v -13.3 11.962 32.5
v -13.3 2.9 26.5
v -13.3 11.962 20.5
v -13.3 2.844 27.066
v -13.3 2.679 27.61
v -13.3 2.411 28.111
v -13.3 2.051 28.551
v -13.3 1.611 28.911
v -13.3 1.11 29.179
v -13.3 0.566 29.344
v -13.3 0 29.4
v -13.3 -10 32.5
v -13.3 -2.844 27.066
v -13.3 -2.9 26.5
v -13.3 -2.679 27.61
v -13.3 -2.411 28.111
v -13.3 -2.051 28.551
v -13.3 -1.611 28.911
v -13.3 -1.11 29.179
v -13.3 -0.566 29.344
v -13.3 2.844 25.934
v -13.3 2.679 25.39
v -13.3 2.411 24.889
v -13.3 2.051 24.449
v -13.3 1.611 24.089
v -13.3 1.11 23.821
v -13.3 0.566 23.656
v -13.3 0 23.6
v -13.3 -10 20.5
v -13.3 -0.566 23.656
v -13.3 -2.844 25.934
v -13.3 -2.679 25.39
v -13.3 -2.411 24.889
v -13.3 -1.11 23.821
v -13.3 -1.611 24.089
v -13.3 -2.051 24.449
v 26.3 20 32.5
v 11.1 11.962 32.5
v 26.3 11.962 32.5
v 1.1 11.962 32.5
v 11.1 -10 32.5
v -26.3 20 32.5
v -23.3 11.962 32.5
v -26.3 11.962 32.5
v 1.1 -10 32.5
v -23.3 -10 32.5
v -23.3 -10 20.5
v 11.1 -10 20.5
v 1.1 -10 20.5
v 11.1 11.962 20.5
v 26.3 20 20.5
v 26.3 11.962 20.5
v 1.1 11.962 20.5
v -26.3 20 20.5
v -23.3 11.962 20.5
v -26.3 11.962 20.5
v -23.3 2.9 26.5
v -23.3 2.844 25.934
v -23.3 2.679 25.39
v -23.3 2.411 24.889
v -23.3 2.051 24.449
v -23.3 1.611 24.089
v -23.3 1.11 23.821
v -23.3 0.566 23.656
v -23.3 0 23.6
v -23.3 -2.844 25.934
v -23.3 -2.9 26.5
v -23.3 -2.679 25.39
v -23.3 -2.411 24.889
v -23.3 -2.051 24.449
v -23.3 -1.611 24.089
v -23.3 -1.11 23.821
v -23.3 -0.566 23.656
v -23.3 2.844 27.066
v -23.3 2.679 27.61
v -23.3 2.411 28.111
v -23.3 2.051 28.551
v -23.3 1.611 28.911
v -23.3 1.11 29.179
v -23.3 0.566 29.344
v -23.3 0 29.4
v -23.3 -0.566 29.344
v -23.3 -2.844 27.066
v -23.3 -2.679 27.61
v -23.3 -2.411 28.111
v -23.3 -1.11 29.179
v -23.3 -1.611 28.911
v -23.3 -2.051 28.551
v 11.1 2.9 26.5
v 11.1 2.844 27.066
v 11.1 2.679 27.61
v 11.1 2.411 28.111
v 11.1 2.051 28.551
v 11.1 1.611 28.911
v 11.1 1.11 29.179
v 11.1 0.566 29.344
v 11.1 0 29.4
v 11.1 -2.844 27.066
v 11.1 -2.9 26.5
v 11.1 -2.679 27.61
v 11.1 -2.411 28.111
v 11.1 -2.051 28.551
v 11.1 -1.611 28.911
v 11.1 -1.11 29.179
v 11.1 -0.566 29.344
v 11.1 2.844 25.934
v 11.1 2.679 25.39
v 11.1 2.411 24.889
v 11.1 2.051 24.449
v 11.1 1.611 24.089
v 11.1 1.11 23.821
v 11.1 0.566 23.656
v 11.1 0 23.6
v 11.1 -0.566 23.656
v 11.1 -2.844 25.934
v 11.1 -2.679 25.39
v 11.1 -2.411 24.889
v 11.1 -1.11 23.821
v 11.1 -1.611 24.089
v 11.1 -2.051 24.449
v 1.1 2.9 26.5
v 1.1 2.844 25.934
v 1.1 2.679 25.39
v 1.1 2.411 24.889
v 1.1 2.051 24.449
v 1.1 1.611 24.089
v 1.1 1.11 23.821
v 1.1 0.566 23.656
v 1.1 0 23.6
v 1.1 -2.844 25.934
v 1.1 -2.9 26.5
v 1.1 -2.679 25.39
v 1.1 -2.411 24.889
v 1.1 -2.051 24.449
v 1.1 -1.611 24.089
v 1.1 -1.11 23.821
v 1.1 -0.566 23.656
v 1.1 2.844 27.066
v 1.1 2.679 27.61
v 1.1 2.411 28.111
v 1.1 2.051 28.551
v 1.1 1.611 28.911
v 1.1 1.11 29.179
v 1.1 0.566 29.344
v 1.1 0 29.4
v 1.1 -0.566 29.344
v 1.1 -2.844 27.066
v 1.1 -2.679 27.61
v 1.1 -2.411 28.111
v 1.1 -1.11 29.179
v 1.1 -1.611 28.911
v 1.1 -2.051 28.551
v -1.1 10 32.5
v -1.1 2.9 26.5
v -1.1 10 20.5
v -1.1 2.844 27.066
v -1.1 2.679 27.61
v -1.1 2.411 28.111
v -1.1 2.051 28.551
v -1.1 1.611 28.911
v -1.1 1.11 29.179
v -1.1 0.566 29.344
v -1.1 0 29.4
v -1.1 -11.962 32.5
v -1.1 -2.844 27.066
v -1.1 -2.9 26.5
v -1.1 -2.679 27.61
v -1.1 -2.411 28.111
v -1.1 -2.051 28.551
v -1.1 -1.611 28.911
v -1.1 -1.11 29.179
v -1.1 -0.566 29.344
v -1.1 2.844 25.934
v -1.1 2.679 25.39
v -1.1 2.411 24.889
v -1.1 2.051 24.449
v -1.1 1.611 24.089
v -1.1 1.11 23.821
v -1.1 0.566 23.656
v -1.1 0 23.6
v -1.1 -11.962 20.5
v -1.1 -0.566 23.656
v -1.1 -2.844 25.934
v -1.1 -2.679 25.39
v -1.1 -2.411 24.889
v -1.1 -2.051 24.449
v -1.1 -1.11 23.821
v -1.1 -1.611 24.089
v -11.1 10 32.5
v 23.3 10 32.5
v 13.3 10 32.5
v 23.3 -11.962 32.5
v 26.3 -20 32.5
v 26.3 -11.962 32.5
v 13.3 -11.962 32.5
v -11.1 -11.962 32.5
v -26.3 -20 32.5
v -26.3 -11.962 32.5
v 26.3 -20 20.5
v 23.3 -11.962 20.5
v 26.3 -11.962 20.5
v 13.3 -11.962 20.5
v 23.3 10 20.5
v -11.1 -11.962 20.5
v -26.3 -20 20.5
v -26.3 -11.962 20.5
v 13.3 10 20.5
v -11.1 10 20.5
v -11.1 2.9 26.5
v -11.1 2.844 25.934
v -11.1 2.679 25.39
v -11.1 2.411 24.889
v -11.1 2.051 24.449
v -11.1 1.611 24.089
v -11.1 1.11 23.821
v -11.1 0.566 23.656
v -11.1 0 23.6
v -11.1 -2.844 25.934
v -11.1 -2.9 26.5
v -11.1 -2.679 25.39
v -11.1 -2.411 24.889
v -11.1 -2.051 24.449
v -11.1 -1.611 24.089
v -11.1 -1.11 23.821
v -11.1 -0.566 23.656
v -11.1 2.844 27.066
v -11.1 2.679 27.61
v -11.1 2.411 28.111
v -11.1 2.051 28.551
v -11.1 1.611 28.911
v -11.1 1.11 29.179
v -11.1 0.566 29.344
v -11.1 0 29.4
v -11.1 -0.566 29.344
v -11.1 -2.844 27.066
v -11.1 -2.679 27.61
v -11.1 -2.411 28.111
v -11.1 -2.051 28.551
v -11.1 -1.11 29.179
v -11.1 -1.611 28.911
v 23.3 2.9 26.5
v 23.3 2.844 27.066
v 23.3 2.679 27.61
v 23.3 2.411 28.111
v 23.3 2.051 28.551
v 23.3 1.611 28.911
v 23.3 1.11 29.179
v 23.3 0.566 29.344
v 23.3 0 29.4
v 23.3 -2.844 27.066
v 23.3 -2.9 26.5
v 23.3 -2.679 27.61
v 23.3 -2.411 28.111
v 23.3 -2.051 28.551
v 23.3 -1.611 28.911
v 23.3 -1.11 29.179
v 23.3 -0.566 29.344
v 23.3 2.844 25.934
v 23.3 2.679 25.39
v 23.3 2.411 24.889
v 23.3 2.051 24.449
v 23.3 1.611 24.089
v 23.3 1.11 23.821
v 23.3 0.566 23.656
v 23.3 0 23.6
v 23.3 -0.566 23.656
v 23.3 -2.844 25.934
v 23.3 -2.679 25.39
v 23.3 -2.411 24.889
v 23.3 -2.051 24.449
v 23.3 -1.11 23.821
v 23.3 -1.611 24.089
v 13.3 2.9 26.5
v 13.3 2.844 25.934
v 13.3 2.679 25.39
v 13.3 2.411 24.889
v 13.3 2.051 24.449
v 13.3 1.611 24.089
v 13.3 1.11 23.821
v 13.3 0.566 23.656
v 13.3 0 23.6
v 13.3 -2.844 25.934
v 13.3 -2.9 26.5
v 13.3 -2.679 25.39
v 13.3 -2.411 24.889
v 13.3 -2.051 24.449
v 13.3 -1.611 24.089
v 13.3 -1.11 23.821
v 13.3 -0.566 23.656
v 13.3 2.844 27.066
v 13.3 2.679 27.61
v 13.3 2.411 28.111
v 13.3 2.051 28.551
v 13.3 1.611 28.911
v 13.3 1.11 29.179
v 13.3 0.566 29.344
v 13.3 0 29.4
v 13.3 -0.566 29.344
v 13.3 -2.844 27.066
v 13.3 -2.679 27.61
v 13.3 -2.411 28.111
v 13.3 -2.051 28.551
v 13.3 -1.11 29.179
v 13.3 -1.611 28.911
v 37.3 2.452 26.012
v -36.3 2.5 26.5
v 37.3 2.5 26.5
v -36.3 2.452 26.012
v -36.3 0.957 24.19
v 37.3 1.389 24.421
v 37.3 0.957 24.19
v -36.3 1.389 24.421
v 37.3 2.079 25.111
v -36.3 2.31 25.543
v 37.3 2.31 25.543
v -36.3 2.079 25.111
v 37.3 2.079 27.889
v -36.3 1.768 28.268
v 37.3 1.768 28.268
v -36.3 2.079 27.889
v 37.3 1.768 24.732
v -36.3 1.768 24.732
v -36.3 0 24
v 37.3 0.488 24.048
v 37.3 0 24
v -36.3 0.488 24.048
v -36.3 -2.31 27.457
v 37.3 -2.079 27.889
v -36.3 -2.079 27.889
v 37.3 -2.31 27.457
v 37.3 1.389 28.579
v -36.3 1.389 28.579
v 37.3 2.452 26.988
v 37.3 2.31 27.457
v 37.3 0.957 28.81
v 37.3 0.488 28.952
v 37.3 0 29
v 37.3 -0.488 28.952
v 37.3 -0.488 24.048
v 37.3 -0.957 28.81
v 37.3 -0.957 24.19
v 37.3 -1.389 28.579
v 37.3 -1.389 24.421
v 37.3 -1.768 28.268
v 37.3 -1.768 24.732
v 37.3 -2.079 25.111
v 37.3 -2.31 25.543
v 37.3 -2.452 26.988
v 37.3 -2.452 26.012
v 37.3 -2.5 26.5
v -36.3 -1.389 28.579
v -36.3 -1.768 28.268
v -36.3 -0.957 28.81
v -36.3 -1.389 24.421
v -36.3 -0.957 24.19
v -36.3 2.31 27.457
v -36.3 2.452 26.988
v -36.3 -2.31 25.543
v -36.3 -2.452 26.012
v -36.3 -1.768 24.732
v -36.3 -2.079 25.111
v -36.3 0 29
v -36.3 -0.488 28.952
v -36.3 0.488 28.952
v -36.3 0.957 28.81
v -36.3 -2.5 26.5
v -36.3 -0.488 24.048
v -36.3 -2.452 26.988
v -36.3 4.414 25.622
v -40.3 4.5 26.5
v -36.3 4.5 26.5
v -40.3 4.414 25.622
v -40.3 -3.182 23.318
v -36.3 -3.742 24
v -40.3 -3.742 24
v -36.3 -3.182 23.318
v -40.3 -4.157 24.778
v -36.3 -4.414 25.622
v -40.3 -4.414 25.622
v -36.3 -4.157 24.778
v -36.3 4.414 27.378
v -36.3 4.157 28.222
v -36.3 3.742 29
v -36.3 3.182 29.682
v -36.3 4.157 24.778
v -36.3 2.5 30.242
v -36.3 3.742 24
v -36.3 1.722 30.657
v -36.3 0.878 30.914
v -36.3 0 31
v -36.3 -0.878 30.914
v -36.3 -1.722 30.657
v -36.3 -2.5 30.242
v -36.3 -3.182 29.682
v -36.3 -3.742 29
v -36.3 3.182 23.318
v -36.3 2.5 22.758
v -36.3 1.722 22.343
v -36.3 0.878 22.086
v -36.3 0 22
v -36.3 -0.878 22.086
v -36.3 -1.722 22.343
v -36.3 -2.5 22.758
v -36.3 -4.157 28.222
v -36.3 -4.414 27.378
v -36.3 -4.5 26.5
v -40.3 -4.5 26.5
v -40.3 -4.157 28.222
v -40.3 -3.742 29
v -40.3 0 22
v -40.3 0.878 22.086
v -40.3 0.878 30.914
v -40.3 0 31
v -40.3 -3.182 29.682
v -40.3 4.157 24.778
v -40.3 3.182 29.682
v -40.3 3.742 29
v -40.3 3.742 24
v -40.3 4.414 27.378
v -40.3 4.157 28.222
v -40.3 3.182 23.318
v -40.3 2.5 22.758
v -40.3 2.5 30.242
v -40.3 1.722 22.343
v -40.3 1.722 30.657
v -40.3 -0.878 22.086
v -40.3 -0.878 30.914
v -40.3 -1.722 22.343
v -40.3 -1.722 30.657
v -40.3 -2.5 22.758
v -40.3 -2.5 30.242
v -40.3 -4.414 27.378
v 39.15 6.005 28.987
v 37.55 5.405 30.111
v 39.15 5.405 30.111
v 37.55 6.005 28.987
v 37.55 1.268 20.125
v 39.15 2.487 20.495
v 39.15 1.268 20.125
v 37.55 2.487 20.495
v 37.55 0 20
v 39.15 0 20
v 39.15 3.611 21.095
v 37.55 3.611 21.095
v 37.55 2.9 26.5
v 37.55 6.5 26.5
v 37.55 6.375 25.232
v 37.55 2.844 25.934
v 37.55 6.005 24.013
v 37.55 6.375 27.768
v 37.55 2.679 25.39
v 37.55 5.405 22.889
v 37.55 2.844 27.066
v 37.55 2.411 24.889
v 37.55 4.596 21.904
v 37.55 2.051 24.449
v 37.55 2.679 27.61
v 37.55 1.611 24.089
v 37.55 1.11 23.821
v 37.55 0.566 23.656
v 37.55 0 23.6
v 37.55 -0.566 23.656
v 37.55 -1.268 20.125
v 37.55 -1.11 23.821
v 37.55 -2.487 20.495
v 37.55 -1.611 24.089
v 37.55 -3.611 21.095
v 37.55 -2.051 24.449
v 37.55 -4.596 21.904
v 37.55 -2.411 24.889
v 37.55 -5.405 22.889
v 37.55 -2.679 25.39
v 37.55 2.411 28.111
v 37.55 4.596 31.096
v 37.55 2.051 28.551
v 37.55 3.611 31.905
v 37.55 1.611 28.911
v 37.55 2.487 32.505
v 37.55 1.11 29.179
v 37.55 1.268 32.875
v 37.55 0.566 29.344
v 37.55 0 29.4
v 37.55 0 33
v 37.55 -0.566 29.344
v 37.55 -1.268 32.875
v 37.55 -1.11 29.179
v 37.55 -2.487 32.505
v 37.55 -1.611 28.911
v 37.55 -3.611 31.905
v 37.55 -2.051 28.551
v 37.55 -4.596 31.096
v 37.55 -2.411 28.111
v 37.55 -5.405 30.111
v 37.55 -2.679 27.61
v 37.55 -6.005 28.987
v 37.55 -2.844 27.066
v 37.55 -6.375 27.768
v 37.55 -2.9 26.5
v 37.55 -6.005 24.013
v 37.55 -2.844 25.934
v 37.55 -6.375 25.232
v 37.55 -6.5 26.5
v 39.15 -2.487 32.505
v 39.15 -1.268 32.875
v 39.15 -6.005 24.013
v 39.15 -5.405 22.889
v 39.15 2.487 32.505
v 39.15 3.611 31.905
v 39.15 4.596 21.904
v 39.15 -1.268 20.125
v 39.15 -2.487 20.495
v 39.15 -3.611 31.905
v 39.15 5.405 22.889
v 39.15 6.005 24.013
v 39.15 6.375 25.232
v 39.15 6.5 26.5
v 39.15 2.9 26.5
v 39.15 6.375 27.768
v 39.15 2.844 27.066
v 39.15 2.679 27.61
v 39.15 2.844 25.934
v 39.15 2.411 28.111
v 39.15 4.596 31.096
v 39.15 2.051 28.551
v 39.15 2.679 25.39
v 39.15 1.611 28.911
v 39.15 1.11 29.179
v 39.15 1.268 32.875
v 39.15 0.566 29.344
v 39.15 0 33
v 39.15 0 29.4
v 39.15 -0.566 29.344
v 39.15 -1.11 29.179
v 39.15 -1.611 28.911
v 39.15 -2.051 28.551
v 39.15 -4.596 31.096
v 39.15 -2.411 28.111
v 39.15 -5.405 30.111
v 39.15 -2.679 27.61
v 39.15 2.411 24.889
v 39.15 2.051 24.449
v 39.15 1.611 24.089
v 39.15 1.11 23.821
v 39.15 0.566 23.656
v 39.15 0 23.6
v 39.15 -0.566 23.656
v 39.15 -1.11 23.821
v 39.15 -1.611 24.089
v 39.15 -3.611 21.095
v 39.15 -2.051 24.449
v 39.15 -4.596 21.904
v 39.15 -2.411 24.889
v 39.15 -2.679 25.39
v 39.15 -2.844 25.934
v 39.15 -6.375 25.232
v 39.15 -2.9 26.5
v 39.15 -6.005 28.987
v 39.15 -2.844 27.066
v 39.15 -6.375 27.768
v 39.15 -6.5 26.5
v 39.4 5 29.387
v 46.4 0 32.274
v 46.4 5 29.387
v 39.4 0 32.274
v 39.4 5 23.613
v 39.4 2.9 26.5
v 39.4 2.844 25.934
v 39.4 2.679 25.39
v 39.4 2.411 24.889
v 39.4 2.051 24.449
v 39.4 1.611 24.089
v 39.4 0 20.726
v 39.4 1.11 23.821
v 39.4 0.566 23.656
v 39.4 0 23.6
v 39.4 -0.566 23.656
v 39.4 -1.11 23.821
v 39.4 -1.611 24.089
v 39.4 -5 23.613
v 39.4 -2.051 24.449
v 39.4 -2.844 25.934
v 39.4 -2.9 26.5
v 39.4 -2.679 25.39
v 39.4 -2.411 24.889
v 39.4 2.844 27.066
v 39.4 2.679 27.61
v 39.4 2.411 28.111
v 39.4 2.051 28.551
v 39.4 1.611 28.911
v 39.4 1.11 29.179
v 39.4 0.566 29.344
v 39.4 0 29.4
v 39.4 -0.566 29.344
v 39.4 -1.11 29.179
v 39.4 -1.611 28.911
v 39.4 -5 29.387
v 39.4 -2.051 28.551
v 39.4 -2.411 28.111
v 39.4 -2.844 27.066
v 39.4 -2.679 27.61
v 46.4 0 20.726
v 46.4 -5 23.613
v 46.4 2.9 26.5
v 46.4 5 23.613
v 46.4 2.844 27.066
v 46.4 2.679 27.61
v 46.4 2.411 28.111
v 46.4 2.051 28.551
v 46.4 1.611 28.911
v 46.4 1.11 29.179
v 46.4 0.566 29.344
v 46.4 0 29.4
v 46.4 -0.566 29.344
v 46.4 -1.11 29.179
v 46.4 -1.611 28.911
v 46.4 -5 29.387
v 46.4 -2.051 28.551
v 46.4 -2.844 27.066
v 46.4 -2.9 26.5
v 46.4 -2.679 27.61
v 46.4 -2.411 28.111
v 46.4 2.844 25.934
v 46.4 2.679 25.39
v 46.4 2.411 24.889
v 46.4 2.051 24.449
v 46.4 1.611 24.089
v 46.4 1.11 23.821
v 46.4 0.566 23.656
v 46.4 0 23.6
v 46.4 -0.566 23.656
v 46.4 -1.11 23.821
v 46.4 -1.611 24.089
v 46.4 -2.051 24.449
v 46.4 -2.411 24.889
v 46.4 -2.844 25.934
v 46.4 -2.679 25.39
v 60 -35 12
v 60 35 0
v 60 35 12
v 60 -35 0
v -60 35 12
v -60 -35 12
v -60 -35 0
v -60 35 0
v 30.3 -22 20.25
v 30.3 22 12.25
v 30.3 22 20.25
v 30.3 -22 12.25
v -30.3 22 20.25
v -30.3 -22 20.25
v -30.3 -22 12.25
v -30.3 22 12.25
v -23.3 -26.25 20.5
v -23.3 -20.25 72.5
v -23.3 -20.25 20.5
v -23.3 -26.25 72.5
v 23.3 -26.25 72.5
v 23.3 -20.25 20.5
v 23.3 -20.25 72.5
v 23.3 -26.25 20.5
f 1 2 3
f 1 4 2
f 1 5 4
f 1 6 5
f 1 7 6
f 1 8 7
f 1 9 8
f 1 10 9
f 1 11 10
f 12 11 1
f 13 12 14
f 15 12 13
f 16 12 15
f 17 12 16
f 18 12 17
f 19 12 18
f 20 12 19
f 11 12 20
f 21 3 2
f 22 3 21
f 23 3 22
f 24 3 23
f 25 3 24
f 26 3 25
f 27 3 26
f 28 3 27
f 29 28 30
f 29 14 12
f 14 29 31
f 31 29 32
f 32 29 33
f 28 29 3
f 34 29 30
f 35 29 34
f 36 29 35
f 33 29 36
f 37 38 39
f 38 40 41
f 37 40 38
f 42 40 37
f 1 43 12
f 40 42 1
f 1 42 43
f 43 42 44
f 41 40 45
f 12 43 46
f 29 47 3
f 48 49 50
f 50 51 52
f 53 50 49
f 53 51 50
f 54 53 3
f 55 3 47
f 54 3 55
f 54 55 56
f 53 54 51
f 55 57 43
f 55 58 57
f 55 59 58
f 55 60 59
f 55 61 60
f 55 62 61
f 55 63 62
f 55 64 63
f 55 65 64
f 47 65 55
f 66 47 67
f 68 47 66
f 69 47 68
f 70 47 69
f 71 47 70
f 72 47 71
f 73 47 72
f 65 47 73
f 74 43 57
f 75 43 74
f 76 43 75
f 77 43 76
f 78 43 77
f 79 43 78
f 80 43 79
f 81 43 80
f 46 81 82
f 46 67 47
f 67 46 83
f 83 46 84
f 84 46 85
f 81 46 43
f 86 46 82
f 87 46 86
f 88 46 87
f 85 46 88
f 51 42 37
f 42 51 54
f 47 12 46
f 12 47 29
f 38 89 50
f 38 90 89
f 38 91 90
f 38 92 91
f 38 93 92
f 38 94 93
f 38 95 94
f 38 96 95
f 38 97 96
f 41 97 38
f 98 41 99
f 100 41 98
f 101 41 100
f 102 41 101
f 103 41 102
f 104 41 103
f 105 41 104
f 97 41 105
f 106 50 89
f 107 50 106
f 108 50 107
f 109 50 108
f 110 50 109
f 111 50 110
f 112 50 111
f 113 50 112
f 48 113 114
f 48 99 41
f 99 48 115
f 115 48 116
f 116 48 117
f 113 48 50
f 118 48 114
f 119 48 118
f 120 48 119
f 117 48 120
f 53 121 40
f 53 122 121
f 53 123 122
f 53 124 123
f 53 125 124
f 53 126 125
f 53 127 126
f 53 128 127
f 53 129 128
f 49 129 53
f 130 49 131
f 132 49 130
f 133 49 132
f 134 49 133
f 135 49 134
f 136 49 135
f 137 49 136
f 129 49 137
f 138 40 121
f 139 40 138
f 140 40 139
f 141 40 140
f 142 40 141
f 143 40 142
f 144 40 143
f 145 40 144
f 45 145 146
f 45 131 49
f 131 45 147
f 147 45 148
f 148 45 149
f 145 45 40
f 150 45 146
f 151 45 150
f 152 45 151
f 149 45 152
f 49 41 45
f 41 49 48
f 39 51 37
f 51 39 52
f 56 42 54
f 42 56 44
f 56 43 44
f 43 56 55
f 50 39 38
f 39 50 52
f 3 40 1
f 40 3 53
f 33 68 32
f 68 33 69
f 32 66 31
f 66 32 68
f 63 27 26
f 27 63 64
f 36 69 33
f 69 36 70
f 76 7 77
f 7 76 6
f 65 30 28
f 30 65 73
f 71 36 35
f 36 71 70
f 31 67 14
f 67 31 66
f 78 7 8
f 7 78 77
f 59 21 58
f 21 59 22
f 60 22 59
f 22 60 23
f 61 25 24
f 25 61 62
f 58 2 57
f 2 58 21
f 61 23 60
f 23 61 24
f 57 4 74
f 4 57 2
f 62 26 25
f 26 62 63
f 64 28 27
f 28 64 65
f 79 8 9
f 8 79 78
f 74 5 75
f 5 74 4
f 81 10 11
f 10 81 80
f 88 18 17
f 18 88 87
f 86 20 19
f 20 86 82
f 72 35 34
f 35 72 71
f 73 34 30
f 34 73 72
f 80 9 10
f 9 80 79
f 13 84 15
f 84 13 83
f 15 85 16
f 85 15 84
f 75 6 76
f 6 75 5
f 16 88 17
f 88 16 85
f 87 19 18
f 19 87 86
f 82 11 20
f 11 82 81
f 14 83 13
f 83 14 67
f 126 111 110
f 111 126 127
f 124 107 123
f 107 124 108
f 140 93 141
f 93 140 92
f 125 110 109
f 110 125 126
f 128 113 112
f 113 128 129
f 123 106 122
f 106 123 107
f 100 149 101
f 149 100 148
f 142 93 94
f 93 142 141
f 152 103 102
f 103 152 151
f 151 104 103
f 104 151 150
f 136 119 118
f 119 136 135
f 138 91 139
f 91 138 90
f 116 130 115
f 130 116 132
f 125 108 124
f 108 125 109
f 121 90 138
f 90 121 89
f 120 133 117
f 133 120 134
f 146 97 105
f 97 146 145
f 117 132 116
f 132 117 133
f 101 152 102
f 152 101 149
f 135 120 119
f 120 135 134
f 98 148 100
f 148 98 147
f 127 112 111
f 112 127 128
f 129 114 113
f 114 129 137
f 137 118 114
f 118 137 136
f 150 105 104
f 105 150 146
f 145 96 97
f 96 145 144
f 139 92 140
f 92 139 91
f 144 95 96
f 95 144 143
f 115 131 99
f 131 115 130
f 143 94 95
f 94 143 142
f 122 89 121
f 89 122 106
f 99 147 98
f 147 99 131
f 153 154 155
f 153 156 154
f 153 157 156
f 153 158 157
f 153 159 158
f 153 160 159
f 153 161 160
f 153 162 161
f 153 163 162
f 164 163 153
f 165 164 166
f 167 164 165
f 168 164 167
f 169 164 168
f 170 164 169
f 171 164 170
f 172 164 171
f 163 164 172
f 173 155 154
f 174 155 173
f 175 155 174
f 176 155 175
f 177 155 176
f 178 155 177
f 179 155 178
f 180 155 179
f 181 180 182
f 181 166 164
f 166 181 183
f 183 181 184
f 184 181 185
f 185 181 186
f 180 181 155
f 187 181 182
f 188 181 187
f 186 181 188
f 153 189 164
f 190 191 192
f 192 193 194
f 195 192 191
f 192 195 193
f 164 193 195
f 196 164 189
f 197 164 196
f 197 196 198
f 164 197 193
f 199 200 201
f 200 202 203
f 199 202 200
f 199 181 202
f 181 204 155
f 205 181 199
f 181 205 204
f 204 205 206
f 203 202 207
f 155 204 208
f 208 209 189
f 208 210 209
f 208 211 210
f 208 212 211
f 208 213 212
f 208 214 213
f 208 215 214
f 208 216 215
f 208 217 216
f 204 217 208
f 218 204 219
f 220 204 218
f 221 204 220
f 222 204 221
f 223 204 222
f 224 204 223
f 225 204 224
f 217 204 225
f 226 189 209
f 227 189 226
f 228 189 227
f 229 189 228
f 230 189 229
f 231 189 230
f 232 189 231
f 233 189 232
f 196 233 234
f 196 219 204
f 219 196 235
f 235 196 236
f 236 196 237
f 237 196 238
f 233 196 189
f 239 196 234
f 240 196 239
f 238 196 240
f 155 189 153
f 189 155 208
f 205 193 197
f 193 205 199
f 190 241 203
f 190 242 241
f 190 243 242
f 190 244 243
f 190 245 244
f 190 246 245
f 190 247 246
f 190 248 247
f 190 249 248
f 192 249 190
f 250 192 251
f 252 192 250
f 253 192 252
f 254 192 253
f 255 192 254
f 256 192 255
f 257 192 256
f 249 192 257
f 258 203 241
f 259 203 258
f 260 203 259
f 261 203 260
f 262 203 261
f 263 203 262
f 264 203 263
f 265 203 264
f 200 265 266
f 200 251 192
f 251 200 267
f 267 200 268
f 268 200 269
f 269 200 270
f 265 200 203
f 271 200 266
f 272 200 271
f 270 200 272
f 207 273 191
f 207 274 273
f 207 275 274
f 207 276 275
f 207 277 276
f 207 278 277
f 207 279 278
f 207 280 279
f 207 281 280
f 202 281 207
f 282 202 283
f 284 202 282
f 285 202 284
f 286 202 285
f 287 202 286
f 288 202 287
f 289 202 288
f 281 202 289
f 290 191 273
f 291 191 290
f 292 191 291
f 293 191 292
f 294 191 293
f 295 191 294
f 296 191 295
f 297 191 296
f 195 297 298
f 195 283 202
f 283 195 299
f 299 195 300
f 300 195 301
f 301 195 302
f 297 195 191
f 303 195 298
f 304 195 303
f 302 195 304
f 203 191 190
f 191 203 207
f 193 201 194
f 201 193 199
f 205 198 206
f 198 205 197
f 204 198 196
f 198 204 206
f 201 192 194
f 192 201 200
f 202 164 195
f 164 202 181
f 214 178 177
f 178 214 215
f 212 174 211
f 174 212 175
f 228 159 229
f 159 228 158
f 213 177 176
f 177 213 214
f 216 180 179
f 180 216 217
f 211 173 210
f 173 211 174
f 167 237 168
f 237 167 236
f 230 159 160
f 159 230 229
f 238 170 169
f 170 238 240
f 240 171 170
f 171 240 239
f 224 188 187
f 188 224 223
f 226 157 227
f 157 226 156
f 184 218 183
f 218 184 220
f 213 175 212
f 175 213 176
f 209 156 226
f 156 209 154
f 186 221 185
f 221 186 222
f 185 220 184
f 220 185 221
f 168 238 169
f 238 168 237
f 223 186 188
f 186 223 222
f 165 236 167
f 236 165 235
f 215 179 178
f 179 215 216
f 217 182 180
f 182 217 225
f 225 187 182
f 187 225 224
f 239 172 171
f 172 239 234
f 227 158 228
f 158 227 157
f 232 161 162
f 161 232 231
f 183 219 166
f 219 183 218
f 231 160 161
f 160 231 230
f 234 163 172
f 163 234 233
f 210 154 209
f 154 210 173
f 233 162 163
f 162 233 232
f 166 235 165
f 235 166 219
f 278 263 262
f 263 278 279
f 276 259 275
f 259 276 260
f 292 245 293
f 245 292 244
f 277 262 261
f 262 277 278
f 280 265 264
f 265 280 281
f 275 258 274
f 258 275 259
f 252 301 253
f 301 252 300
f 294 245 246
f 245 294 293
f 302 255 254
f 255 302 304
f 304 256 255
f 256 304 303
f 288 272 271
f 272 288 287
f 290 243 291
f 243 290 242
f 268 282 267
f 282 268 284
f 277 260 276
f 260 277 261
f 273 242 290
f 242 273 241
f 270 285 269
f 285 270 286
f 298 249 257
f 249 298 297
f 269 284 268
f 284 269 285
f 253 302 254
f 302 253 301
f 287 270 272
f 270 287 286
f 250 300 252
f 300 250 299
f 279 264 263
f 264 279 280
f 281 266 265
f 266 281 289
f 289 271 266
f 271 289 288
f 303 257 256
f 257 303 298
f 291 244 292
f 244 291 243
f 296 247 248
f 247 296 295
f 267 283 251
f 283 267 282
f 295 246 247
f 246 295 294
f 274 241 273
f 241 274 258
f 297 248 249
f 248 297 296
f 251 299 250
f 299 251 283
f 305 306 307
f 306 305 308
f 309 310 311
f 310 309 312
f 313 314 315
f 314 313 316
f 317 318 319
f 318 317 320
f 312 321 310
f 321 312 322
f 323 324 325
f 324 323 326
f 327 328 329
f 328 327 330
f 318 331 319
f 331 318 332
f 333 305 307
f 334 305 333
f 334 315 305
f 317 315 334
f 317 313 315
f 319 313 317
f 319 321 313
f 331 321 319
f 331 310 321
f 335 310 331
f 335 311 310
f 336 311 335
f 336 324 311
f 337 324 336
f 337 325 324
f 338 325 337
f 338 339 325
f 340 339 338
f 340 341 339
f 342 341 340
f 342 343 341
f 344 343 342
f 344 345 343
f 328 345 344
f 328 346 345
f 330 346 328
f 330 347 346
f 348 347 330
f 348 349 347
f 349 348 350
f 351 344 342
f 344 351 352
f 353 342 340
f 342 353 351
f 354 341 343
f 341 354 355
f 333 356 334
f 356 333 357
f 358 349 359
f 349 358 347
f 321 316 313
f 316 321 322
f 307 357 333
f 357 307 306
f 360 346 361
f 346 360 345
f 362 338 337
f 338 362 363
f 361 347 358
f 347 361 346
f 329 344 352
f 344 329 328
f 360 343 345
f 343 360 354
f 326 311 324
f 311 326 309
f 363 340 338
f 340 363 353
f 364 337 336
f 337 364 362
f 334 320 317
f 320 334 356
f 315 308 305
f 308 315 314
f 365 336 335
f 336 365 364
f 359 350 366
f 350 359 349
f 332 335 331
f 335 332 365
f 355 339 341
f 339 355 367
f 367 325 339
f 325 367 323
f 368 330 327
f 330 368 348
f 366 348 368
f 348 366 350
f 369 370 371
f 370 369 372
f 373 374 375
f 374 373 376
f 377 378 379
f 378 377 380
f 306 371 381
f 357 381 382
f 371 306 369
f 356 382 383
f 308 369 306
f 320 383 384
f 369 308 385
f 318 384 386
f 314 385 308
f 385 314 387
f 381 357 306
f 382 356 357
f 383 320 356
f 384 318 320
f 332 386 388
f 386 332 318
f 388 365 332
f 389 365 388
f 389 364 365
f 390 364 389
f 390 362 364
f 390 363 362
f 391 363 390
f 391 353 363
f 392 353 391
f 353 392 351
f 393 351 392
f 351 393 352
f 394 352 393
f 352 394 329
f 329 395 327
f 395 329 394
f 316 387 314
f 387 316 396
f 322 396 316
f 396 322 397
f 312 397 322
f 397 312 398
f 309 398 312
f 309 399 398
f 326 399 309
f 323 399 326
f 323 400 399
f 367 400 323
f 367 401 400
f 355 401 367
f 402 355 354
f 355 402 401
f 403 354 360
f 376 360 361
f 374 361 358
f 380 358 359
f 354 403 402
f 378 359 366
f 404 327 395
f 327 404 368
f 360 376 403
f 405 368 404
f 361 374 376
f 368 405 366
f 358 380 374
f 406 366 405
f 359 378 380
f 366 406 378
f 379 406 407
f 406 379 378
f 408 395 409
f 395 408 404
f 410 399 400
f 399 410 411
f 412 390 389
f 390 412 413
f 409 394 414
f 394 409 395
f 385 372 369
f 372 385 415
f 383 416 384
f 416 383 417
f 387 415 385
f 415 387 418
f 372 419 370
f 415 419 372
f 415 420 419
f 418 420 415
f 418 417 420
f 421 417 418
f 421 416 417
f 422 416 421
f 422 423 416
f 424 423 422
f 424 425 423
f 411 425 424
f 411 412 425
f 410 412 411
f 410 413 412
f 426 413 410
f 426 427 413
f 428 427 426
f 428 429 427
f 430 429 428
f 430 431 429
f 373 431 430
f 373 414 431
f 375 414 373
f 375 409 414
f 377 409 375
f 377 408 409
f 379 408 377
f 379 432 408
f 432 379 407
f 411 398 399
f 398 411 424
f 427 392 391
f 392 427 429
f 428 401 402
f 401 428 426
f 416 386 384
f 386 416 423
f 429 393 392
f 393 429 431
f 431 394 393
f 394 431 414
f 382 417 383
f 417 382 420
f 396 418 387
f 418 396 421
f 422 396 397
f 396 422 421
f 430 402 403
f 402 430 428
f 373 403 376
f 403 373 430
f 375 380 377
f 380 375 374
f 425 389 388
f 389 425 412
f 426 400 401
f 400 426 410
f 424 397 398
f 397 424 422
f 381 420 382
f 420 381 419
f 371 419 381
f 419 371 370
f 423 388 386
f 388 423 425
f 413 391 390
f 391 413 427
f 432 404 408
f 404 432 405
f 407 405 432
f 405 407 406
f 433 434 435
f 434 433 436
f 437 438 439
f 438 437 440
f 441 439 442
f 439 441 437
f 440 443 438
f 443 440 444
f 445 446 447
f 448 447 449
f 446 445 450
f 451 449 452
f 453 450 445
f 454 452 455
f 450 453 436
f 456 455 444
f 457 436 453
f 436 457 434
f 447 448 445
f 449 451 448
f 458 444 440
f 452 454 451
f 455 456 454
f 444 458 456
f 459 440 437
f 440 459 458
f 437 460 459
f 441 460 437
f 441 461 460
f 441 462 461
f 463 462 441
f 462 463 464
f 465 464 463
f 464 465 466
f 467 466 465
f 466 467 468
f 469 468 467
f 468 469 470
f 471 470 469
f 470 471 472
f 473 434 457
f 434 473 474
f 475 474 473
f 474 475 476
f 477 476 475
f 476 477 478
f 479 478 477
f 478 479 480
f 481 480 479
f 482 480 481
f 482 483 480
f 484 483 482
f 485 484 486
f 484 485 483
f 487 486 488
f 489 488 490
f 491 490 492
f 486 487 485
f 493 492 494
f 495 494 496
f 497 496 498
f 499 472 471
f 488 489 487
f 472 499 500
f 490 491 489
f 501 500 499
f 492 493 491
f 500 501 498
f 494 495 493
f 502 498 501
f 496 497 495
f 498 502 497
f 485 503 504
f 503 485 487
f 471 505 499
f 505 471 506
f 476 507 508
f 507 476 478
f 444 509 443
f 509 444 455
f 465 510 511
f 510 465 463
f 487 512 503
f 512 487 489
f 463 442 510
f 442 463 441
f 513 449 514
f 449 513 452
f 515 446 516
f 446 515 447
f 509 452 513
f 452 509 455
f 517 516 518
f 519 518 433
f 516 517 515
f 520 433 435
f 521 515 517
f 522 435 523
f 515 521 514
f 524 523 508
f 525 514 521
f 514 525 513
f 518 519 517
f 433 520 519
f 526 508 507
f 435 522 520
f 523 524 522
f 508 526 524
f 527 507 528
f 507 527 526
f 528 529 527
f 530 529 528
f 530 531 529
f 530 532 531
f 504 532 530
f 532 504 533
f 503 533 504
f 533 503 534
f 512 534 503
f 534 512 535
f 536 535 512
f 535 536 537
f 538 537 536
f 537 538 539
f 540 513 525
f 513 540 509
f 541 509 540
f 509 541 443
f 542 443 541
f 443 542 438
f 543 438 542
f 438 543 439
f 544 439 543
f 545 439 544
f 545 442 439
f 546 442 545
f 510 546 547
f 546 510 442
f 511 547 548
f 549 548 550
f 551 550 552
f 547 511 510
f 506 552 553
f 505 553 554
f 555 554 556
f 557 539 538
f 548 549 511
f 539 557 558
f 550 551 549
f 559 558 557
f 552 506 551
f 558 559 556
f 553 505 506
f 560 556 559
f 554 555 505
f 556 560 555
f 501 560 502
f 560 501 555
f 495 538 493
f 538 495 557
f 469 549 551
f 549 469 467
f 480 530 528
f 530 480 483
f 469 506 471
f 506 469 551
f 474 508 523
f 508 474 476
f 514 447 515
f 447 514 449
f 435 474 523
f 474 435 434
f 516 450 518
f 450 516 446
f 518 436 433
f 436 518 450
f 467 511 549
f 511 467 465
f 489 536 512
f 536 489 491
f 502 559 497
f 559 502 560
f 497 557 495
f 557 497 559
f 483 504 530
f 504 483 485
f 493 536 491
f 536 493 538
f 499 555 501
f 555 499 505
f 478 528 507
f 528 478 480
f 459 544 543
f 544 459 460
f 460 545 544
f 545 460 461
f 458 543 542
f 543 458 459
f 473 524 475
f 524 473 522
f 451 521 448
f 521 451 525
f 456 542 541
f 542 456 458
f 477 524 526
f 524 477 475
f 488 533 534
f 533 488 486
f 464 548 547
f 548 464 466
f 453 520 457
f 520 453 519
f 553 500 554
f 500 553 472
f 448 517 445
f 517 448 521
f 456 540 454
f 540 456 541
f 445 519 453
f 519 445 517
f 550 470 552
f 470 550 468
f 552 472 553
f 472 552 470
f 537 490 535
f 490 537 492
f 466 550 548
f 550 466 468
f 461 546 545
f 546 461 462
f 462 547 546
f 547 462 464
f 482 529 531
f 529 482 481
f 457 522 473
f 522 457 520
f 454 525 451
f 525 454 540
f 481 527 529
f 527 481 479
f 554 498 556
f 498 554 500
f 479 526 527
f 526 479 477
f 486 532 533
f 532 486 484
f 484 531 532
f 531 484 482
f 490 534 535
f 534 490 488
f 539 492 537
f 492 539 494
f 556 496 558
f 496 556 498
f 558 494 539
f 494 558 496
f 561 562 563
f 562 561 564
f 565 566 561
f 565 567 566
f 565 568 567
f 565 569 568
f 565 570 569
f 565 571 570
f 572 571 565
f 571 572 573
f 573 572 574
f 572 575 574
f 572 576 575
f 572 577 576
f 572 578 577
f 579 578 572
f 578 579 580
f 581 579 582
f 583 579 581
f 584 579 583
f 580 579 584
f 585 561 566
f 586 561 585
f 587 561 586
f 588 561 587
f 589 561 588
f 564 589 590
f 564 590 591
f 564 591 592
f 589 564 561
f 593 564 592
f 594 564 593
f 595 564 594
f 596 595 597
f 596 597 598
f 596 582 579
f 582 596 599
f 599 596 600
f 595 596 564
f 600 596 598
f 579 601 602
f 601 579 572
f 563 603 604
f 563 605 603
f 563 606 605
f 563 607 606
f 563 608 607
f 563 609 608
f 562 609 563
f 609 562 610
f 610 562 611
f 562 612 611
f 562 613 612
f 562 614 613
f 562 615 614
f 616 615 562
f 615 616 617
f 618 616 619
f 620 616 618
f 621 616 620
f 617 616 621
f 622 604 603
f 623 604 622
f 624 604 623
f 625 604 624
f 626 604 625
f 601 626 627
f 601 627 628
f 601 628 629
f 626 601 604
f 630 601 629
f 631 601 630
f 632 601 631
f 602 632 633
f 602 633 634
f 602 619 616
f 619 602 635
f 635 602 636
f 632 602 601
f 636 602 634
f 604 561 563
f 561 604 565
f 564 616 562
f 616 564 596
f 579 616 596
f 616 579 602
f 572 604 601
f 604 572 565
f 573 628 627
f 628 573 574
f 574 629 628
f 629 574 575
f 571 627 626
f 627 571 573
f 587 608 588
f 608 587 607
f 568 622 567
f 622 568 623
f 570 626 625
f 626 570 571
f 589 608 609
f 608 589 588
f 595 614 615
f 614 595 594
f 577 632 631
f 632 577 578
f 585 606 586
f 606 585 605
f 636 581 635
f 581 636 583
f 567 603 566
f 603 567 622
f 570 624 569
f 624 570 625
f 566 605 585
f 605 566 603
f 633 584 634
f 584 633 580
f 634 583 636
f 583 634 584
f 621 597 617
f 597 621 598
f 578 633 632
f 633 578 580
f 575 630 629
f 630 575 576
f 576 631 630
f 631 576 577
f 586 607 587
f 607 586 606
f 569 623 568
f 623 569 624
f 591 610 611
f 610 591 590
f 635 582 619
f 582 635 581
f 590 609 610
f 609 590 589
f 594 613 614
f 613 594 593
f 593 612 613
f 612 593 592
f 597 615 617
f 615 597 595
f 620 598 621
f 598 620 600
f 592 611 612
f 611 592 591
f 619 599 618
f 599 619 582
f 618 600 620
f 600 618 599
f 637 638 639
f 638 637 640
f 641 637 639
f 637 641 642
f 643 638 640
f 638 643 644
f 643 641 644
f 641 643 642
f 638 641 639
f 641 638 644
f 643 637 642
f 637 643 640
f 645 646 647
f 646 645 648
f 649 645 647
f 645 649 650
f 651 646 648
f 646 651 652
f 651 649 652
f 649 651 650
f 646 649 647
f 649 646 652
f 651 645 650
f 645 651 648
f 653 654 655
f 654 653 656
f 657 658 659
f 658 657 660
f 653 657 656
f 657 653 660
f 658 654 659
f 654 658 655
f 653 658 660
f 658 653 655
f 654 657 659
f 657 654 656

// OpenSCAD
$fn = 32;

// ------------------------------------------------------------------------
// Comb hinge with flap: leaf 52.6 x 20 mm, pin d5, flap 52 mm
// Every part is its own module, assembly() places every instance.
// ------------------------------------------------------------------------

// --- part 1 ---
module hinge_bed() {
  difference() {
    translate([-60, -35, 0]) cube([120, 70, 12]);
  }
}

// --- part 2 ---
module hinge_riser() {
  difference() {
    translate([-30.3, -22, 0]) cube([60.6, 44, 8]);
  }
}

// --- part 3 ---
module hinge_leaf_a() {
  difference() {
    union() {
      translate([-23.3, -10, -6]) cube([10, 30, 12]);
      translate([1.1, -10, -6]) cube([10, 30, 12]);
      translate([-26.3, 11.962, -6]) cube([52.6, 8.038, 12]);
    }
    translate([-18.3, 0, 0]) rotate([0, 90, 0]) cylinder(h = 12, d = 5.8, center = true);
    translate([6.1, 0, 0]) rotate([0, 90, 0]) cylinder(h = 12, d = 5.8, center = true);
  }
}

// --- part 4 ---
module hinge_leaf_b() {
  difference() {
    union() {
      translate([-11.1, -20, -6]) cube([10, 30, 12]);
      translate([13.3, -20, -6]) cube([10, 30, 12]);
      translate([-26.3, -20, -6]) cube([52.6, 8.038, 12]);
    }
    translate([-6.1, 0, 0]) rotate([0, 90, 0]) cylinder(h = 12, d = 5.8, center = true);
    translate([18.3, 0, 0]) rotate([0, 90, 0]) cylinder(h = 12, d = 5.8, center = true);
  }
}

// --- part 5 ---
module hinge_flap() {
  difference() {
    translate([-23.3, -26, 0]) cube([46.6, 52, 6]);
  }
}

// --- part 6 ---
module hinge_pin() {
  rotate([0, 90, 0]) cylinder(h = 74.6, d = 5, center = true);
  translate([-40.3, 0, 0]) rotate([0, 90, 0]) cylinder(h = 4, d = 9);
}

// --- part 7 ---
module pin_washer() {
  difference() {
      translate([0, 0, 0]) cylinder(h = 1.6, d = 13);
      translate([0, 0, -1]) cylinder(h = 3.6, d = 5.8);
    }
}

// --- part 8 ---
module pin_nut() {
  difference() {
    linear_extrude(height = 7) polygon(points = [[5.774, 0], [2.887, 5], [-2.887, 5], [-5.774, 0], [-2.887, -5], [2.887, -5]]);
    translate([0, 0, -1]) cylinder(h = 9, d = 5.8);
  }
}

// --- assembly ---
module assembly() {
  color([0.80, 0.24, 0.20]) translate([0, 0, 0]) rotate([0, 0, 0]) hinge_bed();
  color([0.20, 0.45, 0.75]) translate([0, 0, 12.25]) rotate([0, 0, 0]) hinge_riser();
  color([0.25, 0.62, 0.32]) translate([0, 0, 26.5]) rotate([0, 0, 0]) hinge_leaf_a();
  color([0.92, 0.70, 0.18]) translate([0, 0, 26.5]) rotate([0, 0, 0]) hinge_leaf_b();
  color([0.58, 0.35, 0.70]) translate([0, -20.25, 46.5]) rotate([90, 0, 0]) hinge_flap();
  color([0.16, 0.66, 0.66]) translate([0, 0, 26.5]) rotate([0, 0, 0]) hinge_pin();
  color([0.85, 0.48, 0.18]) translate([37.55, 0, 26.5]) rotate([0, 90, 0]) pin_washer();
  color([0.55, 0.60, 0.65]) translate([39.4, 0, 26.5]) rotate([0, 90, 0]) pin_nut();
}

assembly();
